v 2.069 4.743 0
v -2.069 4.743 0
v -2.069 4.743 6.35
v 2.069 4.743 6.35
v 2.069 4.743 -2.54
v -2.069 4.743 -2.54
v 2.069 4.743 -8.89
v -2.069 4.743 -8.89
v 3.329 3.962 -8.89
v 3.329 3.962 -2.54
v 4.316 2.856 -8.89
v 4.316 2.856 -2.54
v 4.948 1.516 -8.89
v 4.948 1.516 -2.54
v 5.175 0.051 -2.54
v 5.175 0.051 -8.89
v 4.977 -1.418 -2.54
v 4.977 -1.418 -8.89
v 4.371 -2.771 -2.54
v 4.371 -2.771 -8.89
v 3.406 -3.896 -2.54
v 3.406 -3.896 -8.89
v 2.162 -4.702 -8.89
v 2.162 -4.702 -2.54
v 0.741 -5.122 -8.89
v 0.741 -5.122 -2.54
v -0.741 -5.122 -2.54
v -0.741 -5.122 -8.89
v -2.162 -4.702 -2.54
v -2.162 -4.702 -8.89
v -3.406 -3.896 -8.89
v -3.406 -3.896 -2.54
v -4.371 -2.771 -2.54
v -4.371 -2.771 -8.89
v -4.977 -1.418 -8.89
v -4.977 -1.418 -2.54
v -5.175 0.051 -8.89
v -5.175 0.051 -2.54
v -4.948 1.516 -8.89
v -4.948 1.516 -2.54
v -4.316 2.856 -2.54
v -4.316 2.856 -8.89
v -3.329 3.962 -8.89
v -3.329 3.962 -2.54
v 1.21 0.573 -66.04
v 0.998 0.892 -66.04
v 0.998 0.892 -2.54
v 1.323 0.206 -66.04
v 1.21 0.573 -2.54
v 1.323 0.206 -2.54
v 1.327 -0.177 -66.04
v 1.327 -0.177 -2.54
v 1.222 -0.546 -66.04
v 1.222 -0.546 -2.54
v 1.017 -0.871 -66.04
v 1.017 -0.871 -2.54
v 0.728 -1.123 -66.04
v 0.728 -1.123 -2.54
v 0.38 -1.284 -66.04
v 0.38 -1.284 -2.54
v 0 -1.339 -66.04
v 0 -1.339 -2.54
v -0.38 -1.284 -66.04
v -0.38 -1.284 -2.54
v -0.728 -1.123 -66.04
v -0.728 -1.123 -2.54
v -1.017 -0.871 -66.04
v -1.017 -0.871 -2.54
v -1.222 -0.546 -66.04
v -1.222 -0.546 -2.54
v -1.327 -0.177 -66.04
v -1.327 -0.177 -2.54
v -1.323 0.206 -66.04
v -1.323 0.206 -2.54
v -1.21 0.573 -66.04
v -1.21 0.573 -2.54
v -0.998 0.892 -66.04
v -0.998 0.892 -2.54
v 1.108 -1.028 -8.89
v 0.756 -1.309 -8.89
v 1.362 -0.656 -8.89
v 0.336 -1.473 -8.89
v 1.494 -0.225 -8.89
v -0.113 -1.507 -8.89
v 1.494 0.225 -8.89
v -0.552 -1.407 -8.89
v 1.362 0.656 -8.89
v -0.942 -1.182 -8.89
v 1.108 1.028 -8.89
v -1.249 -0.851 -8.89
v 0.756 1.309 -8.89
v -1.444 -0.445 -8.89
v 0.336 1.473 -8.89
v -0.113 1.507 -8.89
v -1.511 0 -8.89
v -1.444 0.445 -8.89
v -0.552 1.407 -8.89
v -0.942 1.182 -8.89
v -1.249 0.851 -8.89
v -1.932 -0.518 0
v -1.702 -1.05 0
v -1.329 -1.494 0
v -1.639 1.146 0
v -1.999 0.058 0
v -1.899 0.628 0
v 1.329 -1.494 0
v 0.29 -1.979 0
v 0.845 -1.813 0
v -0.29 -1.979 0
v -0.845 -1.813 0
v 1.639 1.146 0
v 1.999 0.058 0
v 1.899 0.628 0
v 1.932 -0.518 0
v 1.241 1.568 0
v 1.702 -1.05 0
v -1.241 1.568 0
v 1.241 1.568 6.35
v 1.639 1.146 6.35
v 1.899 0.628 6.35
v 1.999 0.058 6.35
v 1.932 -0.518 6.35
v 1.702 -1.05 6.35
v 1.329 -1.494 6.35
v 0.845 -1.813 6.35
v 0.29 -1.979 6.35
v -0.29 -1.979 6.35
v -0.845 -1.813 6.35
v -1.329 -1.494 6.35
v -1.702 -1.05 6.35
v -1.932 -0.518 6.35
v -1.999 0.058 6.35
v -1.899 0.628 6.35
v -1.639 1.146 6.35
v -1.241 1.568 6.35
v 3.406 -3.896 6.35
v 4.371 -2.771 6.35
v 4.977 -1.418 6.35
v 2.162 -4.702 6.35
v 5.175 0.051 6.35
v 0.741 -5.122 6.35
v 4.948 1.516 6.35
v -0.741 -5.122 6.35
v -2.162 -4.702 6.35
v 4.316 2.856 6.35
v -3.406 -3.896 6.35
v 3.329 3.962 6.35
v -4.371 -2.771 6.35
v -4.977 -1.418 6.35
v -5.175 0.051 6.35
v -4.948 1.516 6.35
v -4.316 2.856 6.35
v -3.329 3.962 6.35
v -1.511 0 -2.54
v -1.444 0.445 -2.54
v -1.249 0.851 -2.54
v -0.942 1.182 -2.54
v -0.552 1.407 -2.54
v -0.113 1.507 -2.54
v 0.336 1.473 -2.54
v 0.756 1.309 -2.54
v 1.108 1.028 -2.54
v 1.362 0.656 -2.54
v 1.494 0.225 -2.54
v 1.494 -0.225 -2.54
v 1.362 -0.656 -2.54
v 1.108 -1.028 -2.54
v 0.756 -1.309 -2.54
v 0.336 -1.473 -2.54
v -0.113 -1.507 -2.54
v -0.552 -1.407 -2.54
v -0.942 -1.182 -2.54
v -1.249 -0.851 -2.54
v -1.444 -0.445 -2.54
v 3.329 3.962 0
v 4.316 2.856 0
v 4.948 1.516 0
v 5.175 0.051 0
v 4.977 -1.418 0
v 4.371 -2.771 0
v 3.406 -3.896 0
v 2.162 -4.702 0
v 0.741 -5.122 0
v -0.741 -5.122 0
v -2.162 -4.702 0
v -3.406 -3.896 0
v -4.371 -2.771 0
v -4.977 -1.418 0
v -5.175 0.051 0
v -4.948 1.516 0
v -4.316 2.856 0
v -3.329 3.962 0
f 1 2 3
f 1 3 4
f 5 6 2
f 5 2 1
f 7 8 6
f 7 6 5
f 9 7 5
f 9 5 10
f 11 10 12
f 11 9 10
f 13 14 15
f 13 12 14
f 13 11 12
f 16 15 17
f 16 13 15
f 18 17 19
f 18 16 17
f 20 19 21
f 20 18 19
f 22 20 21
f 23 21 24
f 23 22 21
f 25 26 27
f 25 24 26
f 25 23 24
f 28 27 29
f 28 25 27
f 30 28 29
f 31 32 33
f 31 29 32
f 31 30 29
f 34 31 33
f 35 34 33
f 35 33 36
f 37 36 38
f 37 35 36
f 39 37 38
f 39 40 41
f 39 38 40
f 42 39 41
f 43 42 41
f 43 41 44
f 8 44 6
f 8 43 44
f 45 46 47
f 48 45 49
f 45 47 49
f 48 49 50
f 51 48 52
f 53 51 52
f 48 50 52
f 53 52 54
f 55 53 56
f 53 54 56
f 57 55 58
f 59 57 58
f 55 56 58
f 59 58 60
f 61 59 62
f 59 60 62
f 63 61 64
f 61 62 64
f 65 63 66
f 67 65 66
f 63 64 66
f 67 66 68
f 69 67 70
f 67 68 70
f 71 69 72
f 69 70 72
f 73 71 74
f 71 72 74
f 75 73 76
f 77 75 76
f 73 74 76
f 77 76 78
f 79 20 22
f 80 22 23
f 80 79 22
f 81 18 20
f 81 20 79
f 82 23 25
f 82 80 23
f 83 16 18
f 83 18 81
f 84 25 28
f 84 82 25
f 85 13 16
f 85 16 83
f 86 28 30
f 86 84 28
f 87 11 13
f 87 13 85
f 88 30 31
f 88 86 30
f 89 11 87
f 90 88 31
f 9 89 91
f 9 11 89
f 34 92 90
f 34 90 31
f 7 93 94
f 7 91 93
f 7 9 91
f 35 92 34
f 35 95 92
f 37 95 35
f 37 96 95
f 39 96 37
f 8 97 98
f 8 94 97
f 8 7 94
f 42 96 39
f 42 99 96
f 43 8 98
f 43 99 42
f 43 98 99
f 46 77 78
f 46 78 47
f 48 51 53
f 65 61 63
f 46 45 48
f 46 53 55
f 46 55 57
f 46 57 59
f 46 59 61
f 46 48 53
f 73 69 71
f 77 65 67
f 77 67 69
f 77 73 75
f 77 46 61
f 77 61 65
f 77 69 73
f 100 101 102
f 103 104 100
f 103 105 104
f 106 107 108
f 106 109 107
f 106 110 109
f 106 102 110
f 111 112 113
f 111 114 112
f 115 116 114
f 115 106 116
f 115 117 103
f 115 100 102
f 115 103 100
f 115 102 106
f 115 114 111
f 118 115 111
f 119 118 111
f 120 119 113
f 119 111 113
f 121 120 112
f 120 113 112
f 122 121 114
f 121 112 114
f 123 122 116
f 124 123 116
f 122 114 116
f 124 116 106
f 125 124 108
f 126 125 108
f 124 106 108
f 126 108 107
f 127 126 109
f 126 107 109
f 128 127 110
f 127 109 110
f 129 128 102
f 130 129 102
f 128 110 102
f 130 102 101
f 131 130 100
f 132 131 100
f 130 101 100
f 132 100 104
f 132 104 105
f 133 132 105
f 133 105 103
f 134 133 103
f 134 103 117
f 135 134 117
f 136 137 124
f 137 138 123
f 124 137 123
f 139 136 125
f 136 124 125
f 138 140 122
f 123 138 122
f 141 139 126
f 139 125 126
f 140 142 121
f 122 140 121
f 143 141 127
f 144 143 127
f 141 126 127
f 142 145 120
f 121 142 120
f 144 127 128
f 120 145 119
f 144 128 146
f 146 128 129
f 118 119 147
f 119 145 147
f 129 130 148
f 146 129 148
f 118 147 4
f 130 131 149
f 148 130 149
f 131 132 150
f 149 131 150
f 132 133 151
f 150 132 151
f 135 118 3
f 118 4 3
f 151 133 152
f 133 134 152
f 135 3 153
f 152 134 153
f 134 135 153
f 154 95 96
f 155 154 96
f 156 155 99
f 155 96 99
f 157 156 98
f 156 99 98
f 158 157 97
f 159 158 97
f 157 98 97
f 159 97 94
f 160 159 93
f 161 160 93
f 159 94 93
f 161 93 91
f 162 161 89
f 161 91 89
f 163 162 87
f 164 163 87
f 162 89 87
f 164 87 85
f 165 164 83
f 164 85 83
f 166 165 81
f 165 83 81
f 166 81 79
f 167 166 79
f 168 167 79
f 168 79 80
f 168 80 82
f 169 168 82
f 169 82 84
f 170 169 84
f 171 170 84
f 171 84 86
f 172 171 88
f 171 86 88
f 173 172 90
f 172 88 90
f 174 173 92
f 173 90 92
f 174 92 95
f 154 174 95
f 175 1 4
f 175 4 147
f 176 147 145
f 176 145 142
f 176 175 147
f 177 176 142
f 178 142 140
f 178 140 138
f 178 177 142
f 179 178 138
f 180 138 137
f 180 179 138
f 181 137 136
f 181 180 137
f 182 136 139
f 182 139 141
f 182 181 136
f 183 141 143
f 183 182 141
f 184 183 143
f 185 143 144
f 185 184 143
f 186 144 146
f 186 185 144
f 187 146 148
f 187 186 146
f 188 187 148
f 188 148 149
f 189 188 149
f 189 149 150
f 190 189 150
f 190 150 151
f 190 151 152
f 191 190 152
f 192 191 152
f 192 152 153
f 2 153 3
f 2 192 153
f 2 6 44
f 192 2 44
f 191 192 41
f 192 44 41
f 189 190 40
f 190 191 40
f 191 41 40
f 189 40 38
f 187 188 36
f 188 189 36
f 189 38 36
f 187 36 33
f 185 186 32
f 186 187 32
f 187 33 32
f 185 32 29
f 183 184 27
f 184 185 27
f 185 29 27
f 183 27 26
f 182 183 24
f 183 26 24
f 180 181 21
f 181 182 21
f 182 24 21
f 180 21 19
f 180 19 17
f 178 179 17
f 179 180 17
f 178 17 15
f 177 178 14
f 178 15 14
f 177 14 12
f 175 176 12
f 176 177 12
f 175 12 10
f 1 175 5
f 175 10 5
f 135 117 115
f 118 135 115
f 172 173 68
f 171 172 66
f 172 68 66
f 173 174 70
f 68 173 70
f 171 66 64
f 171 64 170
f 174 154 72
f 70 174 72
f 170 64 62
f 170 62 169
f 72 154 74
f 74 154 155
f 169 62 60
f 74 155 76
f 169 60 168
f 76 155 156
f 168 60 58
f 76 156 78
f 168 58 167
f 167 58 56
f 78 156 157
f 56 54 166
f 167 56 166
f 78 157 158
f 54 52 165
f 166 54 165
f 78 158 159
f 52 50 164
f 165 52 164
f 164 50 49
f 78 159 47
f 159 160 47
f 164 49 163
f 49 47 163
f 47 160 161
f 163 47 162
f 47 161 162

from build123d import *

# Parameters (mm, degrees)
BOSS_EXTRUDE1_DEPTH = 6.35
BOSS_EXTRUDE2_START = 2.54
BOSS_EXTRUDE2_DEPTH = 2.54
BOSS_EXTRUDE4_START = 6.35
SKETCH4_R           = 1.5113
BOSS_EXTRUDE4_DEPTH = 6.35
BOSS_EXTRUDE3_DEPTH = 63.5


with BuildPart() as part:
    # Sketch1 → Boss-Extrude1 (new body)
    with BuildSketch(Plane.XY):
        with BuildLine():
            Line((-2.069463106, 4.743200128), (2.069463106, 4.743200128))
            ThreePointArc((2.069463106, 4.743200128), (0, -5.175), (-2.069463106, 4.743200128))
        make_face()
        with BuildLine():
            Line((-1.24126885, 1.568200128), (1.24126885, 1.568200128))
            ThreePointArc((1.24126885, 1.568200128), (0, -2), (-1.24126885, 1.568200128))
        make_face(mode=Mode.SUBTRACT)
    extrude(amount=BOSS_EXTRUDE1_DEPTH)

    # Sketch3 → Boss-Extrude2 (add)
    with BuildSketch(Plane(origin=(0, 0, 0), x_dir=(-1, 0, 0), z_dir=(0, 0, -1)).offset(BOSS_EXTRUDE2_START)):
        with BuildLine():
            Line((-2.069463106, 4.743200128), (2.069463106, 4.743200128))
            ThreePointArc((2.069463106, 4.743200128), (0, -5.175), (-2.069463106, 4.743200128))
        make_face()
    extrude(amount=-BOSS_EXTRUDE2_DEPTH)

    # Sketch4 → Boss-Extrude4 (add)
    with BuildSketch(Plane(origin=(0, 0, -2.54), x_dir=(-1, 0, 0), z_dir=(0, 0, -1)).offset(BOSS_EXTRUDE4_START)):
        with BuildLine():
            Line((2.069463106, 4.743200128), (-2.069463106, 4.743200128))
            ThreePointArc((-2.069463106, 4.743200128), (0, -5.175), (2.069463106, 4.743200128))
        make_face()
        Circle(SKETCH4_R, mode=Mode.SUBTRACT)
    extrude(amount=-BOSS_EXTRUDE4_DEPTH)

    # Sketch2 → Boss-Extrude3 (add)
    with BuildSketch(Plane(origin=(0, 0, -2.54), x_dir=(-1, 0, 0), z_dir=(0, 0, -1))):
        with BuildLine():
            Line((0.997718624, 0.892386667), (-0.997718624, 0.892386667))
            ThreePointArc((-0.997718624, 0.892386667), (0, -1.33858), (0.997718624, 0.892386667))
        make_face()
    extrude(amount=BOSS_EXTRUDE3_DEPTH)


solid = part.part
